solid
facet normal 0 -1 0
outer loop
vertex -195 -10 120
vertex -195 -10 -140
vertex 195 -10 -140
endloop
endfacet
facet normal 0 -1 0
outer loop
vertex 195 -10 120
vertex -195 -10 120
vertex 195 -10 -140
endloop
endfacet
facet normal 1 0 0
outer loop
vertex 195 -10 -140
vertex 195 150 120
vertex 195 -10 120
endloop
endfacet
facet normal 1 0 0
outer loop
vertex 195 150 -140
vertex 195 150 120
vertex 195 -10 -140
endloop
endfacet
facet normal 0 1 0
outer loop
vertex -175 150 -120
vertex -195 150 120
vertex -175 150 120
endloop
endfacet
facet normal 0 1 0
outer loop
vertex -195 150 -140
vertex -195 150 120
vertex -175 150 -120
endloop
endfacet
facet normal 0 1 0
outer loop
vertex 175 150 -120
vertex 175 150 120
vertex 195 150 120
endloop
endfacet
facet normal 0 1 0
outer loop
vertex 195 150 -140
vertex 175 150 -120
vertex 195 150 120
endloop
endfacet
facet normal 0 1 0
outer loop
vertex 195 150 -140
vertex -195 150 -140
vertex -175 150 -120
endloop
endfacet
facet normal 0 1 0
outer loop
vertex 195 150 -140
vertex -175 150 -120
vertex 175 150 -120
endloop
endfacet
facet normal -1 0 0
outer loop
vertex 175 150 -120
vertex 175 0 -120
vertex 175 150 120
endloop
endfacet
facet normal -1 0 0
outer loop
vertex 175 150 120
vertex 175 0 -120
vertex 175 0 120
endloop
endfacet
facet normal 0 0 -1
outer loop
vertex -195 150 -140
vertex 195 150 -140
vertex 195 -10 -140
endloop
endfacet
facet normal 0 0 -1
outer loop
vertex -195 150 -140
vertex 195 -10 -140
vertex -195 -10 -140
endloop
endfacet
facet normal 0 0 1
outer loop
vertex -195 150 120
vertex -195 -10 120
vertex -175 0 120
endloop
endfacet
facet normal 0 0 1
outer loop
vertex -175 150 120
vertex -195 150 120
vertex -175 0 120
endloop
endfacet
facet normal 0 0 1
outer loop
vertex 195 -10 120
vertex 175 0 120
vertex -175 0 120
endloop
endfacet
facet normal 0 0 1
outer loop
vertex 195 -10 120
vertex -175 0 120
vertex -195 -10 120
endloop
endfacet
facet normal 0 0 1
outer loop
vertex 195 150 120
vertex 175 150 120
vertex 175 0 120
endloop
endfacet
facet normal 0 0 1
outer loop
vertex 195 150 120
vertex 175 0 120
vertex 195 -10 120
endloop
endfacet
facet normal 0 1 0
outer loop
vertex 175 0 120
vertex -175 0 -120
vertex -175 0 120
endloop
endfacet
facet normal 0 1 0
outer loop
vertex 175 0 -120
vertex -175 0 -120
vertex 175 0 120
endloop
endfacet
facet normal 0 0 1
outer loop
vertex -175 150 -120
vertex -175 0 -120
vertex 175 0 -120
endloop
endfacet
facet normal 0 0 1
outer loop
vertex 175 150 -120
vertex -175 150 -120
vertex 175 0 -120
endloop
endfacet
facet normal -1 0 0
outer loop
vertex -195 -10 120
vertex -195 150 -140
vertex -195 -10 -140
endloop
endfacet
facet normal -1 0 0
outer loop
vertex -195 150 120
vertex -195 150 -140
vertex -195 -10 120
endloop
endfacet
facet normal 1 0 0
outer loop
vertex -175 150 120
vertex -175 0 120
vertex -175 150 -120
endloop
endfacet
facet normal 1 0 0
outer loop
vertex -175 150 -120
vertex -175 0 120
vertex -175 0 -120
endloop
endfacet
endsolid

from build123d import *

# Parameters (mm, degrees)
BOSS_EXTRUDE1_DEPTH = 150
SKETCH1_3_W         = 390
SKETCH1_3_H         = 260
BOSS_EXTRUDE2_DEPTH = 10


with BuildPart() as part:
    # Sketch1 → Boss-Extrude1 (new body)
    with BuildSketch(Plane(origin=(0, 0, 0), x_dir=(1, 0, 0), z_dir=(0, 1, 0))):
        Polygon((195, 140), (-195, 140), (-195, -120), (-175, -120), (-175, 120), (175, 120), (175, -120), (195, -120), align=None)
    extrude(amount=BOSS_EXTRUDE1_DEPTH)

    # Sketch1<3> → Boss-Extrude2 (add)
    with BuildSketch(Plane(origin=(0, 0, 0), x_dir=(1, 0, 0), z_dir=(0, 1, 0))):
        with Locations((0, 10)):
            Rectangle(SKETCH1_3_W, SKETCH1_3_H)
    extrude(amount=-BOSS_EXTRUDE2_DEPTH)


solid = part.part
